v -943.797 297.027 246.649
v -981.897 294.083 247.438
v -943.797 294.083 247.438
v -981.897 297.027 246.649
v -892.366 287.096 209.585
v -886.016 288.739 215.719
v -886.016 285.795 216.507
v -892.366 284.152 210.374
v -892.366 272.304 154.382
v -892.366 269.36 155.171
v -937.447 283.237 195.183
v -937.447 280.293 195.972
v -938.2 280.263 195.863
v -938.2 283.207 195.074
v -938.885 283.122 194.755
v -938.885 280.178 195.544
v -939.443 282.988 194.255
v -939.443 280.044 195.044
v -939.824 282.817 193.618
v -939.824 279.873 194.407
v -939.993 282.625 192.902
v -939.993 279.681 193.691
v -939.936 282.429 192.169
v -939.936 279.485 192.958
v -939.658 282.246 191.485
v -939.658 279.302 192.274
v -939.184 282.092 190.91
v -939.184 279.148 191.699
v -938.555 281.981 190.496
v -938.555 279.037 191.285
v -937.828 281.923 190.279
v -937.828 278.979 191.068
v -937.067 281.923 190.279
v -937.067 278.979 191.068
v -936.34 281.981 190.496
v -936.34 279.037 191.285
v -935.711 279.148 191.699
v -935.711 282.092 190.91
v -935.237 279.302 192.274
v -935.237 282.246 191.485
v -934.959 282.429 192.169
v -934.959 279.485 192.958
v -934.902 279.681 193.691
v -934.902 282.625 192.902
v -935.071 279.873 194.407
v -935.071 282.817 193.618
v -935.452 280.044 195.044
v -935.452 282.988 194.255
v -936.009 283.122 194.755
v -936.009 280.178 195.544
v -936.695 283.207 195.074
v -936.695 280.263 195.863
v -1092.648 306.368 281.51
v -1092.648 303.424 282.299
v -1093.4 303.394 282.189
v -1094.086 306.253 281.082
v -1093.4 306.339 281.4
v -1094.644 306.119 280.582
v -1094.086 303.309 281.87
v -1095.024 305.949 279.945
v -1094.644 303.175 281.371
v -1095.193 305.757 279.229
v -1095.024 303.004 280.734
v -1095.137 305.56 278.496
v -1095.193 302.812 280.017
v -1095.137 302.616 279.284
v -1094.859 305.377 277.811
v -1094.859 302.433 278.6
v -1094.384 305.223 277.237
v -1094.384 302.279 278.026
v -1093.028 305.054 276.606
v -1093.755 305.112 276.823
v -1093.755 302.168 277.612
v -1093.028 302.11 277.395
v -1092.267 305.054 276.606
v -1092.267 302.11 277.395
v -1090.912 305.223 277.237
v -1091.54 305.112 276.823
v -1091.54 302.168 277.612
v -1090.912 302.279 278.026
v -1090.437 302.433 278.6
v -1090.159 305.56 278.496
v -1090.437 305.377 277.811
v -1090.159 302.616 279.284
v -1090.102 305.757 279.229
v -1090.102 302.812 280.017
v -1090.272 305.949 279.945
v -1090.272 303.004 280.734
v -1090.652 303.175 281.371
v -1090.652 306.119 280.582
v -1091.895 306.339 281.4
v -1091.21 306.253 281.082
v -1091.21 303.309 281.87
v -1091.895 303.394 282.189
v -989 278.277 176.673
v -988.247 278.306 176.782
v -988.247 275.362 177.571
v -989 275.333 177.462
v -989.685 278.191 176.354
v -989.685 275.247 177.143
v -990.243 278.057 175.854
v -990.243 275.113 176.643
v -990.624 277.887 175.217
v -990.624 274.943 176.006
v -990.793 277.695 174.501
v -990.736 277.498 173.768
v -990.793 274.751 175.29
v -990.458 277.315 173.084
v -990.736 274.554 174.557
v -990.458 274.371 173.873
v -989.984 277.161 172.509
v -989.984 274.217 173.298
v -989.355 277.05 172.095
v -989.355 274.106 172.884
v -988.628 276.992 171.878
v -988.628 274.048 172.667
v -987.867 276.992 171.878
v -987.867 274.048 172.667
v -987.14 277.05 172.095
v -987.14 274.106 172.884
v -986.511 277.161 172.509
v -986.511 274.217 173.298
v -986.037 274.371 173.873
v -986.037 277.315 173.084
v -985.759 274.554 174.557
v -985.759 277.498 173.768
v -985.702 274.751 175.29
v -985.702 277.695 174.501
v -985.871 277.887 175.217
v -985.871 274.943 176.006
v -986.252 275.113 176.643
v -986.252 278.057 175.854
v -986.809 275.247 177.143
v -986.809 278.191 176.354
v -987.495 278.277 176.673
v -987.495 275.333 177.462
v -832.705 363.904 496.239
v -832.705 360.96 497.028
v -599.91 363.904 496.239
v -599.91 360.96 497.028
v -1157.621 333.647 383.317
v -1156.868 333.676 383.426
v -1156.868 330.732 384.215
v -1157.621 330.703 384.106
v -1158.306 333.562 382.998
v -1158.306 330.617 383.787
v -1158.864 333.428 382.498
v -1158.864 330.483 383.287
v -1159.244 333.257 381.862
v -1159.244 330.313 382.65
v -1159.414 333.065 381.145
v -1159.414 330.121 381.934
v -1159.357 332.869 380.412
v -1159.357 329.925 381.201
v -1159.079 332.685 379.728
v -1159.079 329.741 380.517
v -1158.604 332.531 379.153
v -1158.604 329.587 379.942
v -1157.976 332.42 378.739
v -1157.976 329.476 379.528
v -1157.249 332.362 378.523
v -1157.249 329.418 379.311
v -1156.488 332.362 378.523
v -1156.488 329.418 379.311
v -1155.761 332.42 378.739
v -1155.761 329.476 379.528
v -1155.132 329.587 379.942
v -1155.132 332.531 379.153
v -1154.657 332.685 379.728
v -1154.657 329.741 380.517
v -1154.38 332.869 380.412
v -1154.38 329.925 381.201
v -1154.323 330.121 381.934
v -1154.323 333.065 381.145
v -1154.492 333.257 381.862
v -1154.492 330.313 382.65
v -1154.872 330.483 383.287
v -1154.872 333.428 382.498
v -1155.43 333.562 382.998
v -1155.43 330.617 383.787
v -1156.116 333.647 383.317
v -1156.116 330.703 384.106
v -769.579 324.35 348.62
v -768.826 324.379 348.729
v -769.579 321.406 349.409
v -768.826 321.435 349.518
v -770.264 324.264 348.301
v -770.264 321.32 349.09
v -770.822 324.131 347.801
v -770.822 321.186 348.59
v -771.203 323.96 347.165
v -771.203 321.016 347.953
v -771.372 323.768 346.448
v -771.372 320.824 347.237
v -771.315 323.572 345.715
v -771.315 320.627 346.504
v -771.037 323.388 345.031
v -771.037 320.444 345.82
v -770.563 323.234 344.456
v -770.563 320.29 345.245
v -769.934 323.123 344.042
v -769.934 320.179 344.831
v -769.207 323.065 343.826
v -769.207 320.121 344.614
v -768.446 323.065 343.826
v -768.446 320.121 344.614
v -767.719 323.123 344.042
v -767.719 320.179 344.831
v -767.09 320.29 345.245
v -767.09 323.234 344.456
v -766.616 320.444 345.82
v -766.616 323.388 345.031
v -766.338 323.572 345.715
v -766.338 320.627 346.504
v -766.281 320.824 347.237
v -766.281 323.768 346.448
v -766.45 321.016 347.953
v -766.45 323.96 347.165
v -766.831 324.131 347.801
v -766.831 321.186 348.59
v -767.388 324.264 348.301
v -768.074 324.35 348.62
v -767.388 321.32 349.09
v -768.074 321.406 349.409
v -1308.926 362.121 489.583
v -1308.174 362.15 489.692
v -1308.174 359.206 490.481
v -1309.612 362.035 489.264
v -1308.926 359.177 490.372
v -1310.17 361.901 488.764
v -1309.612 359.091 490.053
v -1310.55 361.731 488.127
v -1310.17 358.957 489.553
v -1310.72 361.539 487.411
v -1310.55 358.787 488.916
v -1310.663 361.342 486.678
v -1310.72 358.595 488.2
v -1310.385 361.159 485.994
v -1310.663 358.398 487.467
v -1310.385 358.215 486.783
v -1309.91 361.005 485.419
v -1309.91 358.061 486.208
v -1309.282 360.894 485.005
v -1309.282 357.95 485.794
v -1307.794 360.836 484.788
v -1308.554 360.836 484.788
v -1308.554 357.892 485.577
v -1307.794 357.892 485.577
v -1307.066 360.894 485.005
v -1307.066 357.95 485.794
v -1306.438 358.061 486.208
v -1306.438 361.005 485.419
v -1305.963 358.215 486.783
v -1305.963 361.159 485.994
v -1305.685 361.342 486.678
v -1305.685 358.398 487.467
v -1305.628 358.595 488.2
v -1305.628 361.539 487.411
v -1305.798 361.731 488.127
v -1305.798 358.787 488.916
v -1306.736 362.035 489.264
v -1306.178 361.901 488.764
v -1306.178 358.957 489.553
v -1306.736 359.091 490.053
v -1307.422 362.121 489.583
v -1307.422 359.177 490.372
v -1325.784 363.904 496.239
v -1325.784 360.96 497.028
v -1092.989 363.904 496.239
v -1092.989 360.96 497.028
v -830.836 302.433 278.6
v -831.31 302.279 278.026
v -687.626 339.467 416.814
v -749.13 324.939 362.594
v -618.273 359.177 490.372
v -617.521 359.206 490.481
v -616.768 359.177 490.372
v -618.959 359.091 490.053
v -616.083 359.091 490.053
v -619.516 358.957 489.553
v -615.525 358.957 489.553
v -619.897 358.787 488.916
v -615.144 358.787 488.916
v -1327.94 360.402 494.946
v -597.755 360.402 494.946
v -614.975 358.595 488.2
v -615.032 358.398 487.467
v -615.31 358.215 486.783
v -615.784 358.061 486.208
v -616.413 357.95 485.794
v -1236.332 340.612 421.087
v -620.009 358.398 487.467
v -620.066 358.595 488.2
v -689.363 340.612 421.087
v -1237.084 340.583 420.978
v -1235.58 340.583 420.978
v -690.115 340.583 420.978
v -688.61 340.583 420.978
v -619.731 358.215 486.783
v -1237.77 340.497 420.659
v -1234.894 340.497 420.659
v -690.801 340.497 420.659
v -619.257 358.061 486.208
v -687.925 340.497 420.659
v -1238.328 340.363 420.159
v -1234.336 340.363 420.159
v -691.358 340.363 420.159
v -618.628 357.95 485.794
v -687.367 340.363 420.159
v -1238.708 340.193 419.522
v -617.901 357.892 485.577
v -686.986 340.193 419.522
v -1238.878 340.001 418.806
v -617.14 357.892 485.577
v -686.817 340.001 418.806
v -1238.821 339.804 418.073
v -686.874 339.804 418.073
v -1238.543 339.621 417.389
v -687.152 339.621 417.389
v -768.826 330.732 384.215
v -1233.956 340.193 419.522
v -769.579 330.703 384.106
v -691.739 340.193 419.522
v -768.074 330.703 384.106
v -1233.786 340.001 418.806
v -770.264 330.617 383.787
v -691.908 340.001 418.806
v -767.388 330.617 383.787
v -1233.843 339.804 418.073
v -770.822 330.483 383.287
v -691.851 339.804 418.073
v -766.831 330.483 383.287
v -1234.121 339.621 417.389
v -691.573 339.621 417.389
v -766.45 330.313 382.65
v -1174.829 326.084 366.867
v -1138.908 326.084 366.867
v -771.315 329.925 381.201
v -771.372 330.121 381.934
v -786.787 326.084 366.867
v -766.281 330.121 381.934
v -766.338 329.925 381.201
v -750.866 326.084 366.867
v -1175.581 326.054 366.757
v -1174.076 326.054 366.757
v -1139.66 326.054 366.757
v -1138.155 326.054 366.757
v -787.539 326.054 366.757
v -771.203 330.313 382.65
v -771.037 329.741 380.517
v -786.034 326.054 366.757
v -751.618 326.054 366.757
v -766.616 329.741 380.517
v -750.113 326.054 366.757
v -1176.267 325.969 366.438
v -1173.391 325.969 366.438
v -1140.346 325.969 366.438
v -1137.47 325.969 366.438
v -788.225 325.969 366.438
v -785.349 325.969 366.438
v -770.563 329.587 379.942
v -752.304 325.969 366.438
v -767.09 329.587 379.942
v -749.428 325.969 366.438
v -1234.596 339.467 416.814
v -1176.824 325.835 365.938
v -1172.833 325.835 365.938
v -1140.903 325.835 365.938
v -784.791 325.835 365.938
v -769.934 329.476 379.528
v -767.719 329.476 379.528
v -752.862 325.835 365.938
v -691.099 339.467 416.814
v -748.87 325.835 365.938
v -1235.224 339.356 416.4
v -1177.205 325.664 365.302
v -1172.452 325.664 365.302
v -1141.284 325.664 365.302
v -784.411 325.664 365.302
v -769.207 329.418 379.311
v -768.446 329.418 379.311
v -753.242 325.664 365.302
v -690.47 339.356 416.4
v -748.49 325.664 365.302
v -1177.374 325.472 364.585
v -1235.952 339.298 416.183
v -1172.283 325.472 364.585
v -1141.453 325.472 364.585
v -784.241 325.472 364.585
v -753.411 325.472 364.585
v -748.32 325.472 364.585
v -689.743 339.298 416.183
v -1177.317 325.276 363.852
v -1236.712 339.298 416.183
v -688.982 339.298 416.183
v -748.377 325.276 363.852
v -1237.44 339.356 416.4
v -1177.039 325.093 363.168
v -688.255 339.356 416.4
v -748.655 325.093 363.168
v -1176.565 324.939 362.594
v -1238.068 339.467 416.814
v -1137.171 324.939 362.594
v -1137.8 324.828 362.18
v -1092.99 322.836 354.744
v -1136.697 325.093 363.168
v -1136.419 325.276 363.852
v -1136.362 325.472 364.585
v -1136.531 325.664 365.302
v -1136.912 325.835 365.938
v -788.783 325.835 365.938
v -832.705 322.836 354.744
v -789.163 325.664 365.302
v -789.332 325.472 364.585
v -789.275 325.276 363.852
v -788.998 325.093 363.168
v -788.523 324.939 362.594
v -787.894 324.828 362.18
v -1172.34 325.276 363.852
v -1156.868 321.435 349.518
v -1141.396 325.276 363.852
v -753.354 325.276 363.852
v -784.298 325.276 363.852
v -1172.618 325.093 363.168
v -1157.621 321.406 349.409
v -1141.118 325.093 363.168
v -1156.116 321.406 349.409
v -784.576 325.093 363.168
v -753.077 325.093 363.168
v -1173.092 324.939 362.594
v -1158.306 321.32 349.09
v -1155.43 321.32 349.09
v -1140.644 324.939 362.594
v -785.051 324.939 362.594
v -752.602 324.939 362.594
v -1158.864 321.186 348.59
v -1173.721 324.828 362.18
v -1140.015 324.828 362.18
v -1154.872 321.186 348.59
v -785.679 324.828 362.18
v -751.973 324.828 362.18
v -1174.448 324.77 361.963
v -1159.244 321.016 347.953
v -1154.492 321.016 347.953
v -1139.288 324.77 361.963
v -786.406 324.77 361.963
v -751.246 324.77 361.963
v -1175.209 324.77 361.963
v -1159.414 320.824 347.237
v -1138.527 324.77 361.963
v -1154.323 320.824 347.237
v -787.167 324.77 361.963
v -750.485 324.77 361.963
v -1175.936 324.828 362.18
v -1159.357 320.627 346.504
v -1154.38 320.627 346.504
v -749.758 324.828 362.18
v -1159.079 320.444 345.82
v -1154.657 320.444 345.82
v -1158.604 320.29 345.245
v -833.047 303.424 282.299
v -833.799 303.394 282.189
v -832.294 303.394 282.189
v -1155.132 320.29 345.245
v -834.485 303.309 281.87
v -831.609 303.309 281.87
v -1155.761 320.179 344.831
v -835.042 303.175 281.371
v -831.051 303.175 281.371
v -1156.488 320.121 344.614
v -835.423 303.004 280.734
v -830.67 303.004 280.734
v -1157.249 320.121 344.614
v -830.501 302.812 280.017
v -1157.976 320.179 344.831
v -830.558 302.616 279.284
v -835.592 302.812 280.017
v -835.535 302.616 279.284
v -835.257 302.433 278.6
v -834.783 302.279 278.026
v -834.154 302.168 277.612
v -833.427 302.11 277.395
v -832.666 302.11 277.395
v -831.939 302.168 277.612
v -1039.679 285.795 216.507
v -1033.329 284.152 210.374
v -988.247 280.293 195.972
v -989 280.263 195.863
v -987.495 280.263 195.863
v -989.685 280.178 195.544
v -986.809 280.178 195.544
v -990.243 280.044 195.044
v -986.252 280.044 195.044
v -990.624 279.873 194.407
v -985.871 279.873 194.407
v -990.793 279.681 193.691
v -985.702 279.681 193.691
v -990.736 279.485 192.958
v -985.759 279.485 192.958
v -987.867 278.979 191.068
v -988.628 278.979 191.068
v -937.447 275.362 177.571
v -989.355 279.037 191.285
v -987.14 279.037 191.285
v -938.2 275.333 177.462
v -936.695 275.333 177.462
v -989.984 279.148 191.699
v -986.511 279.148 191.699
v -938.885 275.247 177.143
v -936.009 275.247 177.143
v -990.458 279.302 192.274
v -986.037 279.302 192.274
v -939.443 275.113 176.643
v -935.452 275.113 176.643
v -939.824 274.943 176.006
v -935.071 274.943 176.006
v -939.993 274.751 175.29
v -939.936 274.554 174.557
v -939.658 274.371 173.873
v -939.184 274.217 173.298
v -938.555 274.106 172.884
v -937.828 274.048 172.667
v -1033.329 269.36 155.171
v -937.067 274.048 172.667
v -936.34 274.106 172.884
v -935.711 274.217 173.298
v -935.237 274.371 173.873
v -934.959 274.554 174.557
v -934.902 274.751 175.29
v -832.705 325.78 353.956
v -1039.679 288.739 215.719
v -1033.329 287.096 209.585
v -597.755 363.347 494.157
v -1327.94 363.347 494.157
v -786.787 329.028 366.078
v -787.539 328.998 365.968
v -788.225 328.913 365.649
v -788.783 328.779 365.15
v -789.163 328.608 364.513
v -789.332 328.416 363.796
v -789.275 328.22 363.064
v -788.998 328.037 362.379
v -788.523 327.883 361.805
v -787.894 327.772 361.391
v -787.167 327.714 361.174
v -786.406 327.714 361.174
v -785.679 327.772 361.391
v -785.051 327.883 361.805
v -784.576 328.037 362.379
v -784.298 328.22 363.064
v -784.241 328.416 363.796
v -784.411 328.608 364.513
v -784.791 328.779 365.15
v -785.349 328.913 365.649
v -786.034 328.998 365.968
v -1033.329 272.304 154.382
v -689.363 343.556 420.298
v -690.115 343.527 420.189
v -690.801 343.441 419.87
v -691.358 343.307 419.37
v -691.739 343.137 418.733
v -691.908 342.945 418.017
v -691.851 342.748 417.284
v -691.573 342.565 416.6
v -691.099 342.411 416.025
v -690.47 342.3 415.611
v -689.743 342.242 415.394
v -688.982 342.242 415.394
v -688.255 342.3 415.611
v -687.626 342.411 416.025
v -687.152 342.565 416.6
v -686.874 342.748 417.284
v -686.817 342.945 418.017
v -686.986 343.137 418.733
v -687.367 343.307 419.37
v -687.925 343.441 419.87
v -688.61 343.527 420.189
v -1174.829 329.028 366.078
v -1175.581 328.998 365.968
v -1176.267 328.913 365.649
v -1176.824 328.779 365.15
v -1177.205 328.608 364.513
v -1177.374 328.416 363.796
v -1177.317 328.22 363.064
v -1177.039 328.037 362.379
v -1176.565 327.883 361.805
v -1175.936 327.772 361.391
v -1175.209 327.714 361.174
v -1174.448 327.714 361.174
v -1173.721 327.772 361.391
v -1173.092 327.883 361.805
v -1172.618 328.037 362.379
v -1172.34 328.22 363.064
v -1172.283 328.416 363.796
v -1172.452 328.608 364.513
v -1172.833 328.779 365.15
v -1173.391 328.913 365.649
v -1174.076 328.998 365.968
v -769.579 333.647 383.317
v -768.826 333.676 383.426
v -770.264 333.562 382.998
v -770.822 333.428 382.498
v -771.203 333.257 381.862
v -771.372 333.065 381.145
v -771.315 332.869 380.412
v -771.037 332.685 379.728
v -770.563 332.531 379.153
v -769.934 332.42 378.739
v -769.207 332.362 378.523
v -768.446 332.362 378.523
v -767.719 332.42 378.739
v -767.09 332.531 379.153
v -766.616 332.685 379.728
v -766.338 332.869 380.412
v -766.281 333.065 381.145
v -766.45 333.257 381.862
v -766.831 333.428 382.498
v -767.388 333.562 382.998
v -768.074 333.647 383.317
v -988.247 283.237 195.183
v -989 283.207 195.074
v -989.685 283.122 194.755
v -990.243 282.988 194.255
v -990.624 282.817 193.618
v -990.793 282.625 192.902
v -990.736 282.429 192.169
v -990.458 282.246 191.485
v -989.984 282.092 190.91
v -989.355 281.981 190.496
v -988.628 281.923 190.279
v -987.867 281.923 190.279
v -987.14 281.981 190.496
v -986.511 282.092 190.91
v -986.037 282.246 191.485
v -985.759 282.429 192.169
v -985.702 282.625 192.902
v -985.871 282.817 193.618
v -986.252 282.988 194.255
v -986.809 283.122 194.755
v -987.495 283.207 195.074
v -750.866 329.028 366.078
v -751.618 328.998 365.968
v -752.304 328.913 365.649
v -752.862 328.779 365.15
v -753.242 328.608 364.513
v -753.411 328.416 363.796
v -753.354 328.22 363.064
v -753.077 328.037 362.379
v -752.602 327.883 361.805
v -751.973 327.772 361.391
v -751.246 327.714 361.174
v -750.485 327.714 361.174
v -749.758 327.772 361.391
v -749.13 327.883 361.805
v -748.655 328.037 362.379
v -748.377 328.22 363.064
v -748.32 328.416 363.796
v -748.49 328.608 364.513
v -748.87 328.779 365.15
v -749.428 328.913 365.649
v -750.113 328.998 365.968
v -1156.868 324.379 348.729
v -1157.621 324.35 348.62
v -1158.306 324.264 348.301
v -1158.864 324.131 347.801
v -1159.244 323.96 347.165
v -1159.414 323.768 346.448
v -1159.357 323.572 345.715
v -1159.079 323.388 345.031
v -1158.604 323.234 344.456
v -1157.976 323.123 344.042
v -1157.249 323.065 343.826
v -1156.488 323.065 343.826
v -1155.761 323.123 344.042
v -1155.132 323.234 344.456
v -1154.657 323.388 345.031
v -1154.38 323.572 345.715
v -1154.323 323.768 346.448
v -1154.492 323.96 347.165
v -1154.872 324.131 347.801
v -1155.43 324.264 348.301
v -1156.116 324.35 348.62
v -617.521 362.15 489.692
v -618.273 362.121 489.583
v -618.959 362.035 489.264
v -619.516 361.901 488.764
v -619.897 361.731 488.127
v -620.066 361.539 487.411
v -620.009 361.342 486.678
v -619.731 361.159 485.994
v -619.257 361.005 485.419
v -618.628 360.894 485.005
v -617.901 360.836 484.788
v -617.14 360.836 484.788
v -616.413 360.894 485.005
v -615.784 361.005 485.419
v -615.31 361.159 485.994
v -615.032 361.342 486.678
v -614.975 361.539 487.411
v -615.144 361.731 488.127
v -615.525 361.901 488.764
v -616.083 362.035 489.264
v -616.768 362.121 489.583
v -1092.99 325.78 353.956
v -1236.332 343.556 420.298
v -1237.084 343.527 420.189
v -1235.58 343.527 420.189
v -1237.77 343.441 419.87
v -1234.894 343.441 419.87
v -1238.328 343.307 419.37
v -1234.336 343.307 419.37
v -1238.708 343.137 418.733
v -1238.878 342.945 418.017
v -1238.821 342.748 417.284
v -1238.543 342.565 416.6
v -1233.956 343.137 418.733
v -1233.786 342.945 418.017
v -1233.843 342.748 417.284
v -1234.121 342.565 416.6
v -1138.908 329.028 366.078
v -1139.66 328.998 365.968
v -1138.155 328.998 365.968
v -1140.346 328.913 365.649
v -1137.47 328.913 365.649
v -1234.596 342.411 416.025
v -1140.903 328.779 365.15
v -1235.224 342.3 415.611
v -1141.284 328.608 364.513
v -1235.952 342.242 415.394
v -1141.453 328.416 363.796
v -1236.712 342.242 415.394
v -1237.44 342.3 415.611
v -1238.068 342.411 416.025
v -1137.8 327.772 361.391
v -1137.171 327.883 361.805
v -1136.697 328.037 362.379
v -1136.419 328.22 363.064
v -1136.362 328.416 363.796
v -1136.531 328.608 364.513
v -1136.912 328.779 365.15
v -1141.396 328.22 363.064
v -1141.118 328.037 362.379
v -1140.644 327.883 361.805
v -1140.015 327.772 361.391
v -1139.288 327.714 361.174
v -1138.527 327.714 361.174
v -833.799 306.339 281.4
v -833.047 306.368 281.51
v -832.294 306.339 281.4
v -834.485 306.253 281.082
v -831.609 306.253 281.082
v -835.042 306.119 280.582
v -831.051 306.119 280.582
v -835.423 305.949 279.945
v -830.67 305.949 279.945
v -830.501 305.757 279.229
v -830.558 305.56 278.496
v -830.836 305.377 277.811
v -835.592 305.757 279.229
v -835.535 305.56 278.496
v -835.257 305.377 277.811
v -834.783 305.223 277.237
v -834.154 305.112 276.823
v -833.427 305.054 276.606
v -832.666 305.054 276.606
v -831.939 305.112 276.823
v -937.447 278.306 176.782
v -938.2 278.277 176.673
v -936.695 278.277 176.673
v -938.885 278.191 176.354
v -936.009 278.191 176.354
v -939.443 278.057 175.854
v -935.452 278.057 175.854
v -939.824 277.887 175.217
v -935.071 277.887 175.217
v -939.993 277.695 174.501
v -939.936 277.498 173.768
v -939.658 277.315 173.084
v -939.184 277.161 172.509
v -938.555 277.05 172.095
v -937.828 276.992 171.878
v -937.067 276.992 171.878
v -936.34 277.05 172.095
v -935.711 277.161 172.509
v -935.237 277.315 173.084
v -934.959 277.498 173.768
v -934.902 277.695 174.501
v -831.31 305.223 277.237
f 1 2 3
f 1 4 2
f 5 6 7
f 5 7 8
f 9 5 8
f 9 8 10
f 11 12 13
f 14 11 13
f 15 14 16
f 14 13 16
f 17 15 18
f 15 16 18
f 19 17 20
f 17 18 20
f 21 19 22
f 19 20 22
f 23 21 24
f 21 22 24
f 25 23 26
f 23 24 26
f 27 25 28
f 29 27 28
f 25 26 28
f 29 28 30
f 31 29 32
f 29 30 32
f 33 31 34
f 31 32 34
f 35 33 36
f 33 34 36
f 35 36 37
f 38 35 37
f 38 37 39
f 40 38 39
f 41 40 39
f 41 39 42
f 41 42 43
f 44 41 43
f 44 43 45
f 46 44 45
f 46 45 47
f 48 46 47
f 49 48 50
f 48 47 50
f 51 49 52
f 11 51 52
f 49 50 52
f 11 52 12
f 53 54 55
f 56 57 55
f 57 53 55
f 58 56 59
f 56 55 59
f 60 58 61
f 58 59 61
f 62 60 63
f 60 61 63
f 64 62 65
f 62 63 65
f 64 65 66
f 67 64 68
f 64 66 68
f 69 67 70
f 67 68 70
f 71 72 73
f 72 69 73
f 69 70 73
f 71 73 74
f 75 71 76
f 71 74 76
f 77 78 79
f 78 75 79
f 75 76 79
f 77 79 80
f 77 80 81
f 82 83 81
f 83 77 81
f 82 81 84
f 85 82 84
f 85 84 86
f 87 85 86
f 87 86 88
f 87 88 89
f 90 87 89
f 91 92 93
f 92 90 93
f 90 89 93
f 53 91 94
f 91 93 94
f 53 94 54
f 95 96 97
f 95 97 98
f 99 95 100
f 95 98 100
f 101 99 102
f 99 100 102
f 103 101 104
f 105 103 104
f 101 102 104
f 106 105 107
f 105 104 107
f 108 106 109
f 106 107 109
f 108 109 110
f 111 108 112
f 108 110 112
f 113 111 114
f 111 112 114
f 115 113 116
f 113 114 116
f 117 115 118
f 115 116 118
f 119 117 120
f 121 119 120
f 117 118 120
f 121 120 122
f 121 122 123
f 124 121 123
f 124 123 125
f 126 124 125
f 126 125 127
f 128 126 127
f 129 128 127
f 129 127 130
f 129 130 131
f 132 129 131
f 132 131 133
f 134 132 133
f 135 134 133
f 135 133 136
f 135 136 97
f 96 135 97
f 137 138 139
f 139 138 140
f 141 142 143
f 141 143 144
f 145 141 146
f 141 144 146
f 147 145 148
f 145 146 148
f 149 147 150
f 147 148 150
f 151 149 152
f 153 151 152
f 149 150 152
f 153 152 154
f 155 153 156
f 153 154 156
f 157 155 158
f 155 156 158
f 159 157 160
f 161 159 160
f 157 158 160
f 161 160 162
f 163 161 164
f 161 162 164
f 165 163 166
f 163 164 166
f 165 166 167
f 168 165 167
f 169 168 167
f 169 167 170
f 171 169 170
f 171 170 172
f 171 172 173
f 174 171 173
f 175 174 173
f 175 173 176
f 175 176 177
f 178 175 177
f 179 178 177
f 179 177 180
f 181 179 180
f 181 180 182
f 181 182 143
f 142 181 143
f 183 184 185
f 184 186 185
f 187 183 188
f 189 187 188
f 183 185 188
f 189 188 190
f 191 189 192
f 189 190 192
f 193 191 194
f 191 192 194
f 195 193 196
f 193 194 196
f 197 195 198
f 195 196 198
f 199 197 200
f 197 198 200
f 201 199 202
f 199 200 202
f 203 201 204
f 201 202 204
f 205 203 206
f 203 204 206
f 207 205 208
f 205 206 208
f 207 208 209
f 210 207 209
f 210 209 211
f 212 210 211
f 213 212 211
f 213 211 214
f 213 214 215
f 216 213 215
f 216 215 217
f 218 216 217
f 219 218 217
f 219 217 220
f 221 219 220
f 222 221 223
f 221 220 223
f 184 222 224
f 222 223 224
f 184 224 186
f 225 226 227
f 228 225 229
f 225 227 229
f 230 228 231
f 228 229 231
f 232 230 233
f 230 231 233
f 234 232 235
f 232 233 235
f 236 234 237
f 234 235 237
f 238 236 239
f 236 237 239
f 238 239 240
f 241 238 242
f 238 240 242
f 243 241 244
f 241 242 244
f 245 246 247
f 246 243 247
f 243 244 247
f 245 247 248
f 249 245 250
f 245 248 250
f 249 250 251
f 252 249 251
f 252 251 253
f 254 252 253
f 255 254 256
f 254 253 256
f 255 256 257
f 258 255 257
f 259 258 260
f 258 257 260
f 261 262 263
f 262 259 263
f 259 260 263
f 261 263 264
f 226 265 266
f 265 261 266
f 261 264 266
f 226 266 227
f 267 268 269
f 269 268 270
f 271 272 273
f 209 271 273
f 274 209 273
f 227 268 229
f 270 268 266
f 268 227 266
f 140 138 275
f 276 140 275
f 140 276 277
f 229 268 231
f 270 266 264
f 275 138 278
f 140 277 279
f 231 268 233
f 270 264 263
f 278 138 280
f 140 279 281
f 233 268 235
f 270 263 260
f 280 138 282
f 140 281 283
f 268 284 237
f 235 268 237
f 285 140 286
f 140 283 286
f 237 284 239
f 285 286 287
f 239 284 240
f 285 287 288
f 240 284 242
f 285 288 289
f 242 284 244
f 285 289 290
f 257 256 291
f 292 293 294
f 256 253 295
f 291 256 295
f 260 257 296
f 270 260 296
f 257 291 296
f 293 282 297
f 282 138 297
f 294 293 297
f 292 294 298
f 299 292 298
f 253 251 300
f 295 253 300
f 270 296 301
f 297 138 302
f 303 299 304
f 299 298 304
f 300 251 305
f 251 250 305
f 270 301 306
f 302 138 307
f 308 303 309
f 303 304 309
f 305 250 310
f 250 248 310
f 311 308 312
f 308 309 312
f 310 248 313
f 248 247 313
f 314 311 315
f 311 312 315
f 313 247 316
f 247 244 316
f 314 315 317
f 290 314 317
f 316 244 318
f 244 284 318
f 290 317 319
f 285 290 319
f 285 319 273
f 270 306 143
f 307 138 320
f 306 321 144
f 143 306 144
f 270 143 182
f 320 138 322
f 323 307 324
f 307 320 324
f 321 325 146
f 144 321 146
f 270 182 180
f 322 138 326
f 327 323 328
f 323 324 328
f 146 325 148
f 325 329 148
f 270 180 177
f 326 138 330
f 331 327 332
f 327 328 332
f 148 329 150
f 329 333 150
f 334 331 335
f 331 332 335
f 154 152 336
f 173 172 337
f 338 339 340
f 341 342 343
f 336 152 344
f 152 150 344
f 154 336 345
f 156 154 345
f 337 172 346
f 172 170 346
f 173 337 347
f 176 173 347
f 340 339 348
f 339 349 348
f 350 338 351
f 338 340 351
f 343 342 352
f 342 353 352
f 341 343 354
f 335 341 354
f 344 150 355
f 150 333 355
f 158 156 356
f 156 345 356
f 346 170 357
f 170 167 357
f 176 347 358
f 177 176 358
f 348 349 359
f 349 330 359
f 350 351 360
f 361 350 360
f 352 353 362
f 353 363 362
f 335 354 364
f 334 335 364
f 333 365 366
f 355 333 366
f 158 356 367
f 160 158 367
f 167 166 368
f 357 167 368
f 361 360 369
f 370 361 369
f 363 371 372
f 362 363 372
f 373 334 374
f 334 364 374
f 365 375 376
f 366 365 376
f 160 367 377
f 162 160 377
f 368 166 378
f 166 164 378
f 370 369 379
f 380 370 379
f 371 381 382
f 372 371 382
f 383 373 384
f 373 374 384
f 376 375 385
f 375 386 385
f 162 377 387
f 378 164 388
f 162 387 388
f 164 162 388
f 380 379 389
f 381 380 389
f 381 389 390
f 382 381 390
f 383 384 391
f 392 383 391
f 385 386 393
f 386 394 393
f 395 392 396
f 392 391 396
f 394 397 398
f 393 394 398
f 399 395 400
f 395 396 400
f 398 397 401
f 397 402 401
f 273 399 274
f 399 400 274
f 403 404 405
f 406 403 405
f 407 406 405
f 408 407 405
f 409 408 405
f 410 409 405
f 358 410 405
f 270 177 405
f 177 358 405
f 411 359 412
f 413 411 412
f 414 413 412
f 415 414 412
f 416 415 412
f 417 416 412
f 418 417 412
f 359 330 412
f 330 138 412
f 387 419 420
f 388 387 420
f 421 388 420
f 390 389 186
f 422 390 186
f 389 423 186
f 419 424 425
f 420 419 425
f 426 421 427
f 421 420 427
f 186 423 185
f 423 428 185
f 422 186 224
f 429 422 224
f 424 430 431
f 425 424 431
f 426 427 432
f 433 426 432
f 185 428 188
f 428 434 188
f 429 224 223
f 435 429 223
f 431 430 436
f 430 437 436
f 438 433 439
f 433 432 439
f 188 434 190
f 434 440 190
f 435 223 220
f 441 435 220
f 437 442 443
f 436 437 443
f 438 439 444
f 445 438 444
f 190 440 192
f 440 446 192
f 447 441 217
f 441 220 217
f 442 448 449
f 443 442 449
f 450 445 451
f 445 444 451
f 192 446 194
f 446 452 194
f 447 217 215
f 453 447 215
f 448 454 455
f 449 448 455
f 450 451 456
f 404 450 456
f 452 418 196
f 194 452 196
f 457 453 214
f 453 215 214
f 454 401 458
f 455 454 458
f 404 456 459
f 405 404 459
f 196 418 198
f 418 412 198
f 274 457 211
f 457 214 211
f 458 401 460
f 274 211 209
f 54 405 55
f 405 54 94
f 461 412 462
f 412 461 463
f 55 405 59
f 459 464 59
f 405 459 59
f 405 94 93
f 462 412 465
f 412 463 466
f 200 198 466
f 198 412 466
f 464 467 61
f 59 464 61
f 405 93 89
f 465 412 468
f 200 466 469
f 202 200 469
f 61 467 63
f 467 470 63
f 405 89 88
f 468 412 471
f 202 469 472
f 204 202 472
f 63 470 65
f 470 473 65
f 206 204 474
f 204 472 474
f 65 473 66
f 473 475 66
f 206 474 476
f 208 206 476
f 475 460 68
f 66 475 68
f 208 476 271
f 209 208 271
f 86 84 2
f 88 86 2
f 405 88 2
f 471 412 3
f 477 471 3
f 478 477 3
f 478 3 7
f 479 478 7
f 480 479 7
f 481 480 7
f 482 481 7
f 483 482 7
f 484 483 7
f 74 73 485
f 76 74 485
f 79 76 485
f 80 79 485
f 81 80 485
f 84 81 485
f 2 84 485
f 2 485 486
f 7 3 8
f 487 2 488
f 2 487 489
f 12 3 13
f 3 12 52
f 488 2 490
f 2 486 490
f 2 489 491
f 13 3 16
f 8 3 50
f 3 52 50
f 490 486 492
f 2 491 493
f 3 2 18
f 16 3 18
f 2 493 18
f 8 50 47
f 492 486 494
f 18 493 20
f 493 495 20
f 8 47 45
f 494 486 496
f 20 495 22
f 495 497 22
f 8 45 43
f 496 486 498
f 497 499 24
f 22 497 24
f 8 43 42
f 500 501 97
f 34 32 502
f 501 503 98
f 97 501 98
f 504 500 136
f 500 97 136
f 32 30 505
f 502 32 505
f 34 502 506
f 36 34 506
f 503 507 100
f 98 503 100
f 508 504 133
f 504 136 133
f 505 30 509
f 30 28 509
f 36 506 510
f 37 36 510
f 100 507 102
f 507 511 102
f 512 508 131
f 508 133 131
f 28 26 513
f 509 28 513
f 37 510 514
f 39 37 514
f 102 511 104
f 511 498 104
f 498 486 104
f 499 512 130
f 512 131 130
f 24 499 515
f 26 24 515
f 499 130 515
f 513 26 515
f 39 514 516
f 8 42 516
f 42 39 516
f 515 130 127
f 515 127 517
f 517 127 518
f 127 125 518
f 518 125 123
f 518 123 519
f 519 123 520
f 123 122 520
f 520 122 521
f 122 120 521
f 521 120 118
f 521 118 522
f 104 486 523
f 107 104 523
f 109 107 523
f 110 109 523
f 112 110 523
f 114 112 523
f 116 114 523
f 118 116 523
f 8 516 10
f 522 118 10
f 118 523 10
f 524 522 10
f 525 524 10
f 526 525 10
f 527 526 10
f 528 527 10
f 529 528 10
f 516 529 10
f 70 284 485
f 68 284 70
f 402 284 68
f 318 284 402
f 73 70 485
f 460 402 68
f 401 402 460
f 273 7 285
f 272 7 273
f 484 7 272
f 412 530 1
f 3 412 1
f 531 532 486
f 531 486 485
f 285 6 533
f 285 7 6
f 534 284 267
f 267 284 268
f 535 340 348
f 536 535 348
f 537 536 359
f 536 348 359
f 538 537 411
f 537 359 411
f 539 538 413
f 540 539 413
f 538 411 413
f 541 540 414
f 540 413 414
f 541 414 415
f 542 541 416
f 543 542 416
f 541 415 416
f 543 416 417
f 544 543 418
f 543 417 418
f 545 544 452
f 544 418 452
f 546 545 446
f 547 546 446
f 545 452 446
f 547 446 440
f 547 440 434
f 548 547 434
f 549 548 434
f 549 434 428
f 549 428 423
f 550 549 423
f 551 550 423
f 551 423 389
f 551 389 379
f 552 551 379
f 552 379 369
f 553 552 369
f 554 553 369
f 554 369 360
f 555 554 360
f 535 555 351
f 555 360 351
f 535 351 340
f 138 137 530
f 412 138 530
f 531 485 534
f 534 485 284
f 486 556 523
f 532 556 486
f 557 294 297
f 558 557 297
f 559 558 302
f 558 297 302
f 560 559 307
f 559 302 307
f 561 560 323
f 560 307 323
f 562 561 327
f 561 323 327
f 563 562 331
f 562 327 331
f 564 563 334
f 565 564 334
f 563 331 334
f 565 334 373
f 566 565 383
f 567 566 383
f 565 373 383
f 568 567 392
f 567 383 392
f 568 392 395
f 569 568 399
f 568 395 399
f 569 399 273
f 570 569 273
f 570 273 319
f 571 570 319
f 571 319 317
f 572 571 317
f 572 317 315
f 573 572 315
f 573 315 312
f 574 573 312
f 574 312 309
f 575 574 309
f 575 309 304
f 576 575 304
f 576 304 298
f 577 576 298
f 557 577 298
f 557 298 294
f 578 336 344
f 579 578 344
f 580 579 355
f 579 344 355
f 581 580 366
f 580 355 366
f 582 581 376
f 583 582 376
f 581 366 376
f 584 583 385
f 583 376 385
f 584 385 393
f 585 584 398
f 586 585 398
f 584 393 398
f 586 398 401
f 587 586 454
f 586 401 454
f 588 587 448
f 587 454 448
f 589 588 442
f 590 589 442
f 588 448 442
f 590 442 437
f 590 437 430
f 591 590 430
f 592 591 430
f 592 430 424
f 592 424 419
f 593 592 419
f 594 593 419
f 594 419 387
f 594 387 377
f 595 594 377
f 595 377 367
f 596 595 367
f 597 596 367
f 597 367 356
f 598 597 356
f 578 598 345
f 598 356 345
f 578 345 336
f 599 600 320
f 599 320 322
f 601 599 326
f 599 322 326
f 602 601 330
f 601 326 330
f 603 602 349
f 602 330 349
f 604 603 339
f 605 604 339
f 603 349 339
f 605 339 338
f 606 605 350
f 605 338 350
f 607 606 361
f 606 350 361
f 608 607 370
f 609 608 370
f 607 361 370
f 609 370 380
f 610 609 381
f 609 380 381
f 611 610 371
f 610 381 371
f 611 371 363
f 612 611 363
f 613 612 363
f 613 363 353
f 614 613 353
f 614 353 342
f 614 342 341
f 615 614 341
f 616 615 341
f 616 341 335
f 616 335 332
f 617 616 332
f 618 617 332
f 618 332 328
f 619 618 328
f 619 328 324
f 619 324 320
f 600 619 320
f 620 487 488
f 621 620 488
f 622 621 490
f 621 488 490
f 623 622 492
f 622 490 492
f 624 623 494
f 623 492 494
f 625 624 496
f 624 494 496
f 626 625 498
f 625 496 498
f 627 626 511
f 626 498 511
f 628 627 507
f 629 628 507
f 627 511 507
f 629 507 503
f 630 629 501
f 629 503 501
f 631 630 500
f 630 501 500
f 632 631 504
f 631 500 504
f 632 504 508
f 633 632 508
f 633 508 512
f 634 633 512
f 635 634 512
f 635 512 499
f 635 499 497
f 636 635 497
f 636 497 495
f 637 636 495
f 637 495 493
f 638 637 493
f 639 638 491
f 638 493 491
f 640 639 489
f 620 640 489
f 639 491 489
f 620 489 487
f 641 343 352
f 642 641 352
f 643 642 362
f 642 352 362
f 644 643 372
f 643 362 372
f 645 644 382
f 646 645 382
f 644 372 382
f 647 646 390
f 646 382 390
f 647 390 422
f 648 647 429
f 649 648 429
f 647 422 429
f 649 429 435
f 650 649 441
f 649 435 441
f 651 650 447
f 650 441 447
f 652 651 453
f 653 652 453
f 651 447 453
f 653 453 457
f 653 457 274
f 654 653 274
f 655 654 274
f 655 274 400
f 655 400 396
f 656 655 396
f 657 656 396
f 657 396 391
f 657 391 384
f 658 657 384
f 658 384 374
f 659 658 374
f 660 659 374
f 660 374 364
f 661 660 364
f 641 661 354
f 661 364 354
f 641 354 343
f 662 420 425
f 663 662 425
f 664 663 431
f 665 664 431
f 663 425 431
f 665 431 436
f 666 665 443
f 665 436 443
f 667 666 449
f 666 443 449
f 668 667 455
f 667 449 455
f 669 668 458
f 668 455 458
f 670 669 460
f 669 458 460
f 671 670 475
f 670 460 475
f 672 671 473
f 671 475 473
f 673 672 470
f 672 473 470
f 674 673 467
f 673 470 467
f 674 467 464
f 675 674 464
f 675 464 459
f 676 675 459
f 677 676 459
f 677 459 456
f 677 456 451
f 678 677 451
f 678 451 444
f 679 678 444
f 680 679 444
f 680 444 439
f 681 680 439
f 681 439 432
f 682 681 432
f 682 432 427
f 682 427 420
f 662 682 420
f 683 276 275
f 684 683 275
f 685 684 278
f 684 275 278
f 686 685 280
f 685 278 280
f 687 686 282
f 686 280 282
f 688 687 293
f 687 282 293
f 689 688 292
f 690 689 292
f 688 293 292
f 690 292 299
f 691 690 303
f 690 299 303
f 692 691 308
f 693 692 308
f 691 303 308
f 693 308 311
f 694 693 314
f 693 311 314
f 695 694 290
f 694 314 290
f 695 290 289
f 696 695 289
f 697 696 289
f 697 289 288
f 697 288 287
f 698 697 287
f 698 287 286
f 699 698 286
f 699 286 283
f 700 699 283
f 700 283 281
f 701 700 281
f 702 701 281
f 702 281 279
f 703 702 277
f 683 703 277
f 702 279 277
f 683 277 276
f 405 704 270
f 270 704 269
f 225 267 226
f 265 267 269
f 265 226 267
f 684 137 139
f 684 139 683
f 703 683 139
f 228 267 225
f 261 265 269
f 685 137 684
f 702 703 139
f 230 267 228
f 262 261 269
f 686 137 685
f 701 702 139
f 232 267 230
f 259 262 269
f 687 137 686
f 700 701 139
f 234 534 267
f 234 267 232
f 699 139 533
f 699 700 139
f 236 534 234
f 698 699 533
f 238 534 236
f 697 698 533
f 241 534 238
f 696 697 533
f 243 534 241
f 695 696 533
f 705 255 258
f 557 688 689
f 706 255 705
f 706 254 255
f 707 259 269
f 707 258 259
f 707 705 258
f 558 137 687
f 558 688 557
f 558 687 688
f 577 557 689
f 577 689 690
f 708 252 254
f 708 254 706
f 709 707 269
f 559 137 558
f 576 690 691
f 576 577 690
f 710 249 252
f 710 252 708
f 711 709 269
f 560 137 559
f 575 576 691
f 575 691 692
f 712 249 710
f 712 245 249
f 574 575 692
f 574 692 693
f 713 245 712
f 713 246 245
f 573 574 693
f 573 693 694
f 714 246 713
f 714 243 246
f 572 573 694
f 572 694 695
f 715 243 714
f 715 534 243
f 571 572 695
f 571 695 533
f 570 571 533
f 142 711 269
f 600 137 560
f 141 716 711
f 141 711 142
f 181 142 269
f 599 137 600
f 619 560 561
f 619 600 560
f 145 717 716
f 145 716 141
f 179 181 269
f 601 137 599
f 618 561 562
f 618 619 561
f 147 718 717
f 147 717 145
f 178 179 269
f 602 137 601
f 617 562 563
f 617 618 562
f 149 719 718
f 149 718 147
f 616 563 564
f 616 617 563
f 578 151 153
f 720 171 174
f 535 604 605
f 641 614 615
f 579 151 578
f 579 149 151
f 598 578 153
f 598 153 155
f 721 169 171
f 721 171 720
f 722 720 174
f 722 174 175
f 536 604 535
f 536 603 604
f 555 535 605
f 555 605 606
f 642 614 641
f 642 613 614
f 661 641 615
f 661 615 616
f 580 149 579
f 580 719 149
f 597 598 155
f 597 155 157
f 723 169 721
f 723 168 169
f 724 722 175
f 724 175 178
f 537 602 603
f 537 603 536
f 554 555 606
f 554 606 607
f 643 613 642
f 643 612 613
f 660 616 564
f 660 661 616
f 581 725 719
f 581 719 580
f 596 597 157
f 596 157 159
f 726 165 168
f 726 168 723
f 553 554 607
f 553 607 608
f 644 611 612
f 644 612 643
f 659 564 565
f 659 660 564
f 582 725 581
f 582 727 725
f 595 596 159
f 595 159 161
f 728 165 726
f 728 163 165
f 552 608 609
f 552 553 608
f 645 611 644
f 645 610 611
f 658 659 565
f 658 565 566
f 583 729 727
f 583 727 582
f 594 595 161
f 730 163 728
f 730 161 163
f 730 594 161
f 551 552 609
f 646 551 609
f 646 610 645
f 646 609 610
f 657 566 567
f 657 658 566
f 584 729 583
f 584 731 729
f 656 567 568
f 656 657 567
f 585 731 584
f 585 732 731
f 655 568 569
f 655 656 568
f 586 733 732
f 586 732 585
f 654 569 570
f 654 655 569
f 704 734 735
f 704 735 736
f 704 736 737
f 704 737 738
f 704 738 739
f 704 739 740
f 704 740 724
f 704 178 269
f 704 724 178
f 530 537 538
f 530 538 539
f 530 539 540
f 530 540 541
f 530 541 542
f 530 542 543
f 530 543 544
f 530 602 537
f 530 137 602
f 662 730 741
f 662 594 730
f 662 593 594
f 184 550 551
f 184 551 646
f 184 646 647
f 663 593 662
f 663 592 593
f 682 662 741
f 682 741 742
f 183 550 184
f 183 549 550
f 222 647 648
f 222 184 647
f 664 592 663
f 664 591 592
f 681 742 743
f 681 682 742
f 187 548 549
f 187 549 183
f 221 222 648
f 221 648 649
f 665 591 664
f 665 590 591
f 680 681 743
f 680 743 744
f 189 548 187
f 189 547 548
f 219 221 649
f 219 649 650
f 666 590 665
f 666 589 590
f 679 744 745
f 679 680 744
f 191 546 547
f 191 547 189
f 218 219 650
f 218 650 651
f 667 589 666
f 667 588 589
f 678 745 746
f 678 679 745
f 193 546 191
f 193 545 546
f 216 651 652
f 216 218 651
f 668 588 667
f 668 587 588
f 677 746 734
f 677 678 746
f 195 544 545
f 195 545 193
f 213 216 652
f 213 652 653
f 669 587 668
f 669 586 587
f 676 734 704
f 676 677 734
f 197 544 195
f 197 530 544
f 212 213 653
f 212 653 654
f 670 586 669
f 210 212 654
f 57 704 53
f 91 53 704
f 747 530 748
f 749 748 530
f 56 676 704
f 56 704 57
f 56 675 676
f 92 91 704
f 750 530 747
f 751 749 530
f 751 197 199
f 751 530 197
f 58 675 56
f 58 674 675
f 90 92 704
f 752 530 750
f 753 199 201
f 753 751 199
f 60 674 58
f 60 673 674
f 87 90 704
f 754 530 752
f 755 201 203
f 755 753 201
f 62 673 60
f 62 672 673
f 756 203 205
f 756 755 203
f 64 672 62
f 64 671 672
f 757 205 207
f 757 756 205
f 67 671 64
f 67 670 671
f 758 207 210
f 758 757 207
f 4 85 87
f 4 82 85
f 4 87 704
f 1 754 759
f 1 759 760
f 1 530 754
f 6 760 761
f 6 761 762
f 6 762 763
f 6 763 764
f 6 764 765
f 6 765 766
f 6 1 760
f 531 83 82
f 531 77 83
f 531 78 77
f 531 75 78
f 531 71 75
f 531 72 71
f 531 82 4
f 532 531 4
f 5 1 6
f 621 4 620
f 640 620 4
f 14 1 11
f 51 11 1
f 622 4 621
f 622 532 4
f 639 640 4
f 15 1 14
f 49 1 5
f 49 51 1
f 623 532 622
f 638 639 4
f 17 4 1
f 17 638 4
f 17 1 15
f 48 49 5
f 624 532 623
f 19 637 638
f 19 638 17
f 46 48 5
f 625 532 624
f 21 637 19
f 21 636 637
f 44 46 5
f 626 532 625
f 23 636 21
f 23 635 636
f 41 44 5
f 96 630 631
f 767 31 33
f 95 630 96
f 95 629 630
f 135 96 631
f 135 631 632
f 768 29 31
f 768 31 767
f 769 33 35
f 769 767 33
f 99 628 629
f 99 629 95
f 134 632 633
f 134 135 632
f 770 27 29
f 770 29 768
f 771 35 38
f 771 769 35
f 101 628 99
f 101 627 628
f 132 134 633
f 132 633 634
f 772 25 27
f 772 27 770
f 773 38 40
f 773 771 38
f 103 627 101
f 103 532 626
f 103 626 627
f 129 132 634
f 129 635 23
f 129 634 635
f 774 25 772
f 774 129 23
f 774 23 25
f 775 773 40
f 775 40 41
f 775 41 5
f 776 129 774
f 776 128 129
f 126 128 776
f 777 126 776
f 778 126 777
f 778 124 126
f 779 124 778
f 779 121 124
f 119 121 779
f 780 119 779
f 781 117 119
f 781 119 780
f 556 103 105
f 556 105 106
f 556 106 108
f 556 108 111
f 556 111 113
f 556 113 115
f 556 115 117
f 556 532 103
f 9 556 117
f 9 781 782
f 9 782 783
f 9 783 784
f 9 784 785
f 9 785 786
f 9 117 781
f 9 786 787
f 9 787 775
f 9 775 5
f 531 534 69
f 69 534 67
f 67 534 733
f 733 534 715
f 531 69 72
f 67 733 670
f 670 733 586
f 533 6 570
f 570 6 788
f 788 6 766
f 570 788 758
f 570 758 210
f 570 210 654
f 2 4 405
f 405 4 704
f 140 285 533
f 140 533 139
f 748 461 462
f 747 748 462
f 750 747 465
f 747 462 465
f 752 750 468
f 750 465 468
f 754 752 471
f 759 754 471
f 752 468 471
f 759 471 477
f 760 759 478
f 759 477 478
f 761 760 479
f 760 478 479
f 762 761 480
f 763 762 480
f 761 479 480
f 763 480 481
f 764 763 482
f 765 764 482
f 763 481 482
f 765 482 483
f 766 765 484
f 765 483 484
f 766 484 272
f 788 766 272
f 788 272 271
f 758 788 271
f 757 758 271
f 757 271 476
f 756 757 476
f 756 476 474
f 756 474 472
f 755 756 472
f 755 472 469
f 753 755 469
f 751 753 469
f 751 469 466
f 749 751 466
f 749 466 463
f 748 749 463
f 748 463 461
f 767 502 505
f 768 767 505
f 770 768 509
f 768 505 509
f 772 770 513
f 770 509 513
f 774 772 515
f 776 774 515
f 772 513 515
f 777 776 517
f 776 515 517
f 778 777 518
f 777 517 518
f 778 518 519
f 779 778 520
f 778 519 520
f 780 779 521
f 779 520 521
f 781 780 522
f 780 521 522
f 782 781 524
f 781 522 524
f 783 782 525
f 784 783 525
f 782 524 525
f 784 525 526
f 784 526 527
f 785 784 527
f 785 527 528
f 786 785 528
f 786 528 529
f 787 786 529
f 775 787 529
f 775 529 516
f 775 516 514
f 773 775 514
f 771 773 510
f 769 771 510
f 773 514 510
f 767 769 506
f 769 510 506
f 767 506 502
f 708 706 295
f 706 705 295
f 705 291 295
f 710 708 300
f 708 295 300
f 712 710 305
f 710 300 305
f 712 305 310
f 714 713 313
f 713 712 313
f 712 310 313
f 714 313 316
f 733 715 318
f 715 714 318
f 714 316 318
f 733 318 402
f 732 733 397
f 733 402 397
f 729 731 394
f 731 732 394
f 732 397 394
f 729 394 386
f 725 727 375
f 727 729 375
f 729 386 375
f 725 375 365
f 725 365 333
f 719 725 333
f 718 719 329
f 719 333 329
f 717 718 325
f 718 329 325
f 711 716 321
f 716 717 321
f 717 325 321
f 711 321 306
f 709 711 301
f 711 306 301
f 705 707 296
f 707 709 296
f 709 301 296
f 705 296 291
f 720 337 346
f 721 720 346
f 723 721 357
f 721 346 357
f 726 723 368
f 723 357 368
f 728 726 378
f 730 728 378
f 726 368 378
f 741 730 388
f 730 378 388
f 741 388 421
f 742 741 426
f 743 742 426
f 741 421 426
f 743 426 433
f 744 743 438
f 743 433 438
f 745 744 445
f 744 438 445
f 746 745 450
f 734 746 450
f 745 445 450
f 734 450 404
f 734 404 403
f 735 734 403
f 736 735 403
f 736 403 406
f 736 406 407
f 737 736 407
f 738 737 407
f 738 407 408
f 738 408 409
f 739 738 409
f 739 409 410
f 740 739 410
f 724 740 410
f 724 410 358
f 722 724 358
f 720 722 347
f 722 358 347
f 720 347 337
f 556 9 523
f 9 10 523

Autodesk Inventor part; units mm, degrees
ref_plane "YZ Plane" through (0, 0, 0) normal (1, 0, 0) x (0, 1, 0)
ref_plane "Work Plane1" through (-1041.8338, 286.0261, 217.3698) normal (0, 0.9659258, -0.258819) x (0.7071068, -0.1830127, -0.6830127)
sketch "Sketch1" plane through (-1041.8338, 286.0261, 217.3698) normal (0, 0.9659258, -0.258819) x (0.7071068, -0.1830127, -0.6830127)
  line L0 (110.8111, -517.2111) -> (110.8111, -110.8111) construction
  line L1 (109.9183, -108.6558) -> (2.1553, -0.8927) construction
  line L2 (107.7631, -517.2111) -> (-203.2, -206.248) construction
  line L3 (2.1553, -0.8927) -> (110.8111, -109.5486)
  line L4 (110.8111, -109.5486) -> (110.8111, -517.2111)
  line L5 (110.8111, -517.2111) -> (107.7631, -517.2111)
  line L6 (107.7631, -517.2111) -> (-203.2, -206.248)
  line L7 (56.4832, -55.2206) -> (-148.8721, -260.5759) construction
  line L8 (110.8111, -109.5486) -> (2.1553, -0.8927)
  line L9 (2.1553, -0.8927) -> (-405.5073, -0.8927)
  line L10 (-405.5073, -0.8927) -> (-405.5073, -3.9407)
  line L11 (-405.5073, -3.9407) -> (-94.5442, -314.9038)
  line L12 (110.8111, -109.5486) -> (155.7124, -64.6473)
  line L13 (155.7124, -64.6473) -> (47.0565, 44.0085)
  line L14 (47.0565, 44.0085) -> (2.1553, -0.8927)
  line L15 (2.1553, -0.8927) -> (110.8111, -109.5486)
  point P0 (937.5005, -535.875)
  point P1 (2.1553, -0.8927)
  point P2 (-203.2, -206.248)
  point P3 (110.8111, -109.5486)
  dimension "d1" = 63.5
extrude "Plate1" add sketch "Sketch1" along normal blind 3.048
sketch "Sketch2" plane through (-1041.8338, 288.9702, 216.5809) normal (0, 0.9659258, -0.258819) x (0.7071068, 0.1830127, 0.6830127)
  line L0 (-44.0085, 47.0565) -> (64.6473, 155.7124) construction
  line L1 (64.6473, 155.7124) -> (109.5486, 110.8111) construction
  line L2 (10.3194, 101.3844) -> (24.957, 86.7468) construction
  point P0 (535.875, 937.5005)
  point P1 (42.8728, 104.752)
  point P2 (6.9518, 68.831)
  point P3 (56.3432, 91.2817)
  point P4 (20.4222, 55.3606)
  dimension "d2" = 20.6375
  dimension "d3" = 20.6375
  dimension "d4" = 50.8
  dimension "d7" = 19.05
  dimension "d12" = 25.4
hole "Hole1" at (-937.4473, 277.6455, 174.3166) at (-988.2473, 277.6455, 174.3166) at (-937.4473, 282.576, 192.7175) at (-988.2473, 282.576, 192.7175) direction (0, -0.9659258, 0.258819) diameter 5.1054 end through all clearance for "Flat Head Machine Screw (82)" size "#10" standard "Ansi Unified Screw Threads"
sketch "Sketch3" plane through (-1041.8338, 288.9702, 216.5809) normal (0, 0.9659258, -0.258819) x (0.7071068, 0.1830127, 0.6830127)
  circle A0 centre (56.3432, 91.2817) radius 2.5527 construction
  circle A1 centre (42.8728, 104.752) radius 2.5527 construction
  circle A2 centre (6.9518, 68.831) radius 2.5527 construction
  circle A3 centre (20.4222, 55.3606) radius 2.5527 construction
  line L0 (517.2111, 110.8111) -> (517.2111, 107.7631) construction
  line L1 (109.5486, 110.8111) -> (517.2111, 110.8111) construction
  line L2 (64.6473, 155.7124) -> (109.5486, 110.8111) construction
  line L3 (-44.0085, 47.0565) -> (64.6473, 155.7124) construction
  line L4 (0.8927, 2.1553) -> (-44.0085, 47.0565) construction
  line L5 (0.8927, -405.5073) -> (0.8927, 2.1553) construction
  line L6 (3.9407, -405.5073) -> (0.8927, -405.5073) construction
  line L7 (517.2111, 107.7631) -> (3.9407, -405.5073) construction
  line L8 (10.3194, 101.3844) -> (260.5759, -148.8721) construction
  line L9 (313.3798, 110.8111) -> (313.3798, 98.1111) construction
  line L10 (109.5486, 110.8111) -> (517.2111, 110.8111) construction
  point P0 (535.875, 937.5005)
  point P1 (287.9798, 98.1111)
  point P2 (313.3798, 72.7111)
  point P3 (287.9798, 72.7111)
  point P4 (13.5927, -201.676)
  point P5 (13.5927, -176.276)
  point P6 (38.9927, -201.676)
  point P7 (38.9927, -176.276)
  dimension "d20" = 12.7
  dimension "d23" = 25.4
  dimension "d26" = 25.4
hole "Hole2" at (-750.8658, 328.3671, 363.6122) at (-768.8263, 323.7186, 346.2637) at (-768.8263, 333.0157, 380.9607) at (-786.7868, 328.3671, 363.6122) at (-1156.8682, 333.0157, 380.9607) at (-1138.9077, 328.3671, 363.6122) at (-1174.8287, 328.3671, 363.6122) at (-1156.8682, 323.7186, 346.2637) direction (0, -0.9659258, 0.258819) diameter 5.1054 end through all clearance for "Flat Head Machine Screw (82)" size "#10" standard "Ansi Unified Screw Threads"
sketch "Sketch4" plane through (-1041.8338, 288.9702, 216.5809) normal (0, 0.9659258, -0.258819) x (0.7071068, 0.1830127, 0.6830127)
  line L0 (109.5486, 110.8111) -> (64.6473, 155.7124) projected
  line L1 (109.5486, 110.8111) -> (100.5683, 110.8111)
  line L2 (109.5486, 110.8111) -> (517.2111, 110.8111) projected
  line L3 (100.5683, 110.8111) -> (60.1571, 151.2222)
  line L4 (-44.0085, 47.0565) -> (64.6473, 155.7124) projected
  line L5 (64.6473, 155.7124) -> (60.1571, 151.2222)
  point P0 (535.875, 937.5005)
  dimension "d36" = 6.35
extrude "Cut1" cut sketch "Sketch4" against normal blind 3.048
ref_plane "Work Plane2" through (-962.8473, 265.9096, 142.2942) normal (1, 0, 0) x (0, -0.9659258, 0.258819)
mirror "Mirror1" about plane through (-962.8473, 265.9096, 142.2942) normal (1, 0, 0) of "Cut1"
sketch "Sketch5" plane through (-1041.8338, 288.9702, 216.5809) normal (0, 0.9659258, -0.258819) x (0.7071068, 0.1830127, 0.6830127)
  line L0 (100.5683, 110.8111) -> (517.2111, 110.8111) projected
  line L1 (517.2111, 101.9084) -> (109.471, 101.9084) construction
  line L2 (517.2111, 110.8111) -> (517.2111, 107.7631) projected
  line L3 (100.5683, 110.8111) -> (60.1571, 151.2222) projected
  point P0 (535.875, 937.5005)
  point P1 (498.1611, 101.9084)
  point P2 (396.5611, 101.9084)
  point P3 (193.3611, 101.9084)
  dimension "d40" = 8.9027
  dimension "d41" = 101.6
  dimension "d42" = 19.05
  dimension "d45" = 203.2
hole "Hole3" at (-617.5206, 361.4895, 487.2266) at (-689.3626, 342.8954, 417.8325) at (-833.0467, 305.7072, 279.0443) direction (0, -0.9659258, 0.258819) diameter 5.1054 end through all
mirror "Mirror2" about plane through (-962.8473, 265.9096, 142.2942) normal (1, 0, 0) of "Hole3"
sketch "Sketch8" plane through (-1041.8338, 288.9702, 216.5809) normal (0, 0.9659258, -0.258819) x (0.7071068, 0.1830127, 0.6830127)
  line L0 (352.6003, -56.8477) -> (248.4416, 47.3111)
  line L1 (248.4416, 47.3111) -> (91.3335, 47.3111)
  line L2 (64.3927, 20.3703) -> (64.3927, -136.7378)
  line L3 (64.3927, -136.7378) -> (168.5515, -240.8965)
  line L4 (0.8927, 11.1355) -> (0.8927, -405.5073) projected
  line L5 (100.5683, 110.8111) -> (517.2111, 110.8111) projected
  line L6 (517.2111, 107.7631) -> (3.9407, -405.5073) projected
  line L7 (-39.5184, 51.5467) -> (60.1571, 151.2222) construction
  line L8 (10.3194, 101.3844) -> (260.5759, -148.8721) construction
  line L9 (64.3927, 20.3703) -> (91.3335, 47.3111)
  point P0 (535.875, 937.5005)
  point P1 (64.3927, -58.1837)
  dimension "d62" = 63.5
  dimension "d65" = 234.95
  dimension "d66" = 234.95
  dimension "d75" = 63.5
  dimension "d76" = 135
  dimension "d77" = 135
extrude "Extrusion2" cut sketch "Sketch8" against normal blind 25.4
equation "\"d3\" = d2"
equation "\"d18\" = Thickness"
equation "\"d37\" = Thickness"
equation "\"d51\" = Thickness"
equation "\"d0\" = Thickness"
equation "\"BendRadius\" = Thickness"
equation "\"BendReliefWidth\" = Thickness"
equation "\"BendReliefDepth\" = 0.5 * Thickness"
equation "\"CornerReliefSize\" = 4 * Thickness"
equation "\"MinimumRemnant\" = 2 * Thickness"
equation "\"TransitionRadius\" = BendRadius"
equation "\"JacobiRadiusSize\" = BendRadius"
equation "\"GapSize\" = Thickness"
equation "\"Thickness\" = 3.048"
properties part number "hopper_back" material "Polycarbonate, Clear"
